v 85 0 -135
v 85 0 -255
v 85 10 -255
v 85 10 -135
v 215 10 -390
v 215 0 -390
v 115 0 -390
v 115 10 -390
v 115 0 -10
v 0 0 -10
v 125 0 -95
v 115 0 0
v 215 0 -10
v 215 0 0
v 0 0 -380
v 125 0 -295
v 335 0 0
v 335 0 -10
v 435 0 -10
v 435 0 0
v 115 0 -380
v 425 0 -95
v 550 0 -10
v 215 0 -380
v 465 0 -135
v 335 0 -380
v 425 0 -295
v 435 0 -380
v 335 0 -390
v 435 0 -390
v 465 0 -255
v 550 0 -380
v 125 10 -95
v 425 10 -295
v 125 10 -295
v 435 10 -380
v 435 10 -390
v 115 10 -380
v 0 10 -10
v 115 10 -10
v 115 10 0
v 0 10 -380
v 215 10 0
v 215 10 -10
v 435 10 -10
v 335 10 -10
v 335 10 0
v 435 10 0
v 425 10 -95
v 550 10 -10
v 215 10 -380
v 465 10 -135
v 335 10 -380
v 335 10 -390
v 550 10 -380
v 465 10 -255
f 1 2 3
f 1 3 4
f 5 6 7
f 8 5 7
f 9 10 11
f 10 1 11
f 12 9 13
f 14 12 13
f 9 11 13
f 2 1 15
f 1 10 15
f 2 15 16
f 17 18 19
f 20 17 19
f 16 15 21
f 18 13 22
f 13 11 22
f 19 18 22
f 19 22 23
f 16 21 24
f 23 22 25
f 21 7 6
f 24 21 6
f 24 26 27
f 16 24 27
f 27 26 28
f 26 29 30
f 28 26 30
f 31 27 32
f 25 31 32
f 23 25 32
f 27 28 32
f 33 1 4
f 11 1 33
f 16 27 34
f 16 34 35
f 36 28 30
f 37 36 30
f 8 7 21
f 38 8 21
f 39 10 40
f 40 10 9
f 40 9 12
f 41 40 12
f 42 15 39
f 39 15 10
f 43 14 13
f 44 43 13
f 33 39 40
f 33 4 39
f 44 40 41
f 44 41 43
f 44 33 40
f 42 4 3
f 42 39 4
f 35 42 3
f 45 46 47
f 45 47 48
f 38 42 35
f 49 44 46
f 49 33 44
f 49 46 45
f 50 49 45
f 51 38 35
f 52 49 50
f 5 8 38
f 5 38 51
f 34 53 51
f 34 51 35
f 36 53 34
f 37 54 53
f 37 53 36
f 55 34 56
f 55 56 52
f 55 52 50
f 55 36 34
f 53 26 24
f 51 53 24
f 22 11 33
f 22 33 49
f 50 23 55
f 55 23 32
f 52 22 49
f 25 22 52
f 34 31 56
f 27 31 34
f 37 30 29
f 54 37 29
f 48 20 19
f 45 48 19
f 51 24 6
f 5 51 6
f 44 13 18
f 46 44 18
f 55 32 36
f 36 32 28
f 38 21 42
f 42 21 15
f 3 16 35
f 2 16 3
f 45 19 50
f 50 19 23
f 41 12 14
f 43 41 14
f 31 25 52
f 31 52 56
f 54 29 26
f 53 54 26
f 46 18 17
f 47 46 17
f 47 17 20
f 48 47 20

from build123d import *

# Parameters (mm, degrees)
BOSS_EXTRU_1_DEPTH = 10


with BuildPart() as part:
    # Esquisse1 → Boss.-Extru.1 (new body)
    with BuildSketch(Plane(origin=(0, 0, 0), x_dir=(1, 0, 0), z_dir=(0, 1, 0))):
        Polygon((0, 10), (115, 10), (115, 0), (215, 0), (215, 10), (335, 10), (335, 0), (435, 0), (435, 10), (550, 10), (550, 380), (435, 380), (435, 390), (335, 390), (335, 380), (215, 380), (215, 390), (115, 390), (115, 380), (0, 380), align=None)
        Polygon((85, 135), (125, 95), (425, 95), (465, 135), (465, 255), (425, 295), (125, 295), (85, 255), align=None, mode=Mode.SUBTRACT)
    extrude(amount=BOSS_EXTRU_1_DEPTH)


solid = part.part
